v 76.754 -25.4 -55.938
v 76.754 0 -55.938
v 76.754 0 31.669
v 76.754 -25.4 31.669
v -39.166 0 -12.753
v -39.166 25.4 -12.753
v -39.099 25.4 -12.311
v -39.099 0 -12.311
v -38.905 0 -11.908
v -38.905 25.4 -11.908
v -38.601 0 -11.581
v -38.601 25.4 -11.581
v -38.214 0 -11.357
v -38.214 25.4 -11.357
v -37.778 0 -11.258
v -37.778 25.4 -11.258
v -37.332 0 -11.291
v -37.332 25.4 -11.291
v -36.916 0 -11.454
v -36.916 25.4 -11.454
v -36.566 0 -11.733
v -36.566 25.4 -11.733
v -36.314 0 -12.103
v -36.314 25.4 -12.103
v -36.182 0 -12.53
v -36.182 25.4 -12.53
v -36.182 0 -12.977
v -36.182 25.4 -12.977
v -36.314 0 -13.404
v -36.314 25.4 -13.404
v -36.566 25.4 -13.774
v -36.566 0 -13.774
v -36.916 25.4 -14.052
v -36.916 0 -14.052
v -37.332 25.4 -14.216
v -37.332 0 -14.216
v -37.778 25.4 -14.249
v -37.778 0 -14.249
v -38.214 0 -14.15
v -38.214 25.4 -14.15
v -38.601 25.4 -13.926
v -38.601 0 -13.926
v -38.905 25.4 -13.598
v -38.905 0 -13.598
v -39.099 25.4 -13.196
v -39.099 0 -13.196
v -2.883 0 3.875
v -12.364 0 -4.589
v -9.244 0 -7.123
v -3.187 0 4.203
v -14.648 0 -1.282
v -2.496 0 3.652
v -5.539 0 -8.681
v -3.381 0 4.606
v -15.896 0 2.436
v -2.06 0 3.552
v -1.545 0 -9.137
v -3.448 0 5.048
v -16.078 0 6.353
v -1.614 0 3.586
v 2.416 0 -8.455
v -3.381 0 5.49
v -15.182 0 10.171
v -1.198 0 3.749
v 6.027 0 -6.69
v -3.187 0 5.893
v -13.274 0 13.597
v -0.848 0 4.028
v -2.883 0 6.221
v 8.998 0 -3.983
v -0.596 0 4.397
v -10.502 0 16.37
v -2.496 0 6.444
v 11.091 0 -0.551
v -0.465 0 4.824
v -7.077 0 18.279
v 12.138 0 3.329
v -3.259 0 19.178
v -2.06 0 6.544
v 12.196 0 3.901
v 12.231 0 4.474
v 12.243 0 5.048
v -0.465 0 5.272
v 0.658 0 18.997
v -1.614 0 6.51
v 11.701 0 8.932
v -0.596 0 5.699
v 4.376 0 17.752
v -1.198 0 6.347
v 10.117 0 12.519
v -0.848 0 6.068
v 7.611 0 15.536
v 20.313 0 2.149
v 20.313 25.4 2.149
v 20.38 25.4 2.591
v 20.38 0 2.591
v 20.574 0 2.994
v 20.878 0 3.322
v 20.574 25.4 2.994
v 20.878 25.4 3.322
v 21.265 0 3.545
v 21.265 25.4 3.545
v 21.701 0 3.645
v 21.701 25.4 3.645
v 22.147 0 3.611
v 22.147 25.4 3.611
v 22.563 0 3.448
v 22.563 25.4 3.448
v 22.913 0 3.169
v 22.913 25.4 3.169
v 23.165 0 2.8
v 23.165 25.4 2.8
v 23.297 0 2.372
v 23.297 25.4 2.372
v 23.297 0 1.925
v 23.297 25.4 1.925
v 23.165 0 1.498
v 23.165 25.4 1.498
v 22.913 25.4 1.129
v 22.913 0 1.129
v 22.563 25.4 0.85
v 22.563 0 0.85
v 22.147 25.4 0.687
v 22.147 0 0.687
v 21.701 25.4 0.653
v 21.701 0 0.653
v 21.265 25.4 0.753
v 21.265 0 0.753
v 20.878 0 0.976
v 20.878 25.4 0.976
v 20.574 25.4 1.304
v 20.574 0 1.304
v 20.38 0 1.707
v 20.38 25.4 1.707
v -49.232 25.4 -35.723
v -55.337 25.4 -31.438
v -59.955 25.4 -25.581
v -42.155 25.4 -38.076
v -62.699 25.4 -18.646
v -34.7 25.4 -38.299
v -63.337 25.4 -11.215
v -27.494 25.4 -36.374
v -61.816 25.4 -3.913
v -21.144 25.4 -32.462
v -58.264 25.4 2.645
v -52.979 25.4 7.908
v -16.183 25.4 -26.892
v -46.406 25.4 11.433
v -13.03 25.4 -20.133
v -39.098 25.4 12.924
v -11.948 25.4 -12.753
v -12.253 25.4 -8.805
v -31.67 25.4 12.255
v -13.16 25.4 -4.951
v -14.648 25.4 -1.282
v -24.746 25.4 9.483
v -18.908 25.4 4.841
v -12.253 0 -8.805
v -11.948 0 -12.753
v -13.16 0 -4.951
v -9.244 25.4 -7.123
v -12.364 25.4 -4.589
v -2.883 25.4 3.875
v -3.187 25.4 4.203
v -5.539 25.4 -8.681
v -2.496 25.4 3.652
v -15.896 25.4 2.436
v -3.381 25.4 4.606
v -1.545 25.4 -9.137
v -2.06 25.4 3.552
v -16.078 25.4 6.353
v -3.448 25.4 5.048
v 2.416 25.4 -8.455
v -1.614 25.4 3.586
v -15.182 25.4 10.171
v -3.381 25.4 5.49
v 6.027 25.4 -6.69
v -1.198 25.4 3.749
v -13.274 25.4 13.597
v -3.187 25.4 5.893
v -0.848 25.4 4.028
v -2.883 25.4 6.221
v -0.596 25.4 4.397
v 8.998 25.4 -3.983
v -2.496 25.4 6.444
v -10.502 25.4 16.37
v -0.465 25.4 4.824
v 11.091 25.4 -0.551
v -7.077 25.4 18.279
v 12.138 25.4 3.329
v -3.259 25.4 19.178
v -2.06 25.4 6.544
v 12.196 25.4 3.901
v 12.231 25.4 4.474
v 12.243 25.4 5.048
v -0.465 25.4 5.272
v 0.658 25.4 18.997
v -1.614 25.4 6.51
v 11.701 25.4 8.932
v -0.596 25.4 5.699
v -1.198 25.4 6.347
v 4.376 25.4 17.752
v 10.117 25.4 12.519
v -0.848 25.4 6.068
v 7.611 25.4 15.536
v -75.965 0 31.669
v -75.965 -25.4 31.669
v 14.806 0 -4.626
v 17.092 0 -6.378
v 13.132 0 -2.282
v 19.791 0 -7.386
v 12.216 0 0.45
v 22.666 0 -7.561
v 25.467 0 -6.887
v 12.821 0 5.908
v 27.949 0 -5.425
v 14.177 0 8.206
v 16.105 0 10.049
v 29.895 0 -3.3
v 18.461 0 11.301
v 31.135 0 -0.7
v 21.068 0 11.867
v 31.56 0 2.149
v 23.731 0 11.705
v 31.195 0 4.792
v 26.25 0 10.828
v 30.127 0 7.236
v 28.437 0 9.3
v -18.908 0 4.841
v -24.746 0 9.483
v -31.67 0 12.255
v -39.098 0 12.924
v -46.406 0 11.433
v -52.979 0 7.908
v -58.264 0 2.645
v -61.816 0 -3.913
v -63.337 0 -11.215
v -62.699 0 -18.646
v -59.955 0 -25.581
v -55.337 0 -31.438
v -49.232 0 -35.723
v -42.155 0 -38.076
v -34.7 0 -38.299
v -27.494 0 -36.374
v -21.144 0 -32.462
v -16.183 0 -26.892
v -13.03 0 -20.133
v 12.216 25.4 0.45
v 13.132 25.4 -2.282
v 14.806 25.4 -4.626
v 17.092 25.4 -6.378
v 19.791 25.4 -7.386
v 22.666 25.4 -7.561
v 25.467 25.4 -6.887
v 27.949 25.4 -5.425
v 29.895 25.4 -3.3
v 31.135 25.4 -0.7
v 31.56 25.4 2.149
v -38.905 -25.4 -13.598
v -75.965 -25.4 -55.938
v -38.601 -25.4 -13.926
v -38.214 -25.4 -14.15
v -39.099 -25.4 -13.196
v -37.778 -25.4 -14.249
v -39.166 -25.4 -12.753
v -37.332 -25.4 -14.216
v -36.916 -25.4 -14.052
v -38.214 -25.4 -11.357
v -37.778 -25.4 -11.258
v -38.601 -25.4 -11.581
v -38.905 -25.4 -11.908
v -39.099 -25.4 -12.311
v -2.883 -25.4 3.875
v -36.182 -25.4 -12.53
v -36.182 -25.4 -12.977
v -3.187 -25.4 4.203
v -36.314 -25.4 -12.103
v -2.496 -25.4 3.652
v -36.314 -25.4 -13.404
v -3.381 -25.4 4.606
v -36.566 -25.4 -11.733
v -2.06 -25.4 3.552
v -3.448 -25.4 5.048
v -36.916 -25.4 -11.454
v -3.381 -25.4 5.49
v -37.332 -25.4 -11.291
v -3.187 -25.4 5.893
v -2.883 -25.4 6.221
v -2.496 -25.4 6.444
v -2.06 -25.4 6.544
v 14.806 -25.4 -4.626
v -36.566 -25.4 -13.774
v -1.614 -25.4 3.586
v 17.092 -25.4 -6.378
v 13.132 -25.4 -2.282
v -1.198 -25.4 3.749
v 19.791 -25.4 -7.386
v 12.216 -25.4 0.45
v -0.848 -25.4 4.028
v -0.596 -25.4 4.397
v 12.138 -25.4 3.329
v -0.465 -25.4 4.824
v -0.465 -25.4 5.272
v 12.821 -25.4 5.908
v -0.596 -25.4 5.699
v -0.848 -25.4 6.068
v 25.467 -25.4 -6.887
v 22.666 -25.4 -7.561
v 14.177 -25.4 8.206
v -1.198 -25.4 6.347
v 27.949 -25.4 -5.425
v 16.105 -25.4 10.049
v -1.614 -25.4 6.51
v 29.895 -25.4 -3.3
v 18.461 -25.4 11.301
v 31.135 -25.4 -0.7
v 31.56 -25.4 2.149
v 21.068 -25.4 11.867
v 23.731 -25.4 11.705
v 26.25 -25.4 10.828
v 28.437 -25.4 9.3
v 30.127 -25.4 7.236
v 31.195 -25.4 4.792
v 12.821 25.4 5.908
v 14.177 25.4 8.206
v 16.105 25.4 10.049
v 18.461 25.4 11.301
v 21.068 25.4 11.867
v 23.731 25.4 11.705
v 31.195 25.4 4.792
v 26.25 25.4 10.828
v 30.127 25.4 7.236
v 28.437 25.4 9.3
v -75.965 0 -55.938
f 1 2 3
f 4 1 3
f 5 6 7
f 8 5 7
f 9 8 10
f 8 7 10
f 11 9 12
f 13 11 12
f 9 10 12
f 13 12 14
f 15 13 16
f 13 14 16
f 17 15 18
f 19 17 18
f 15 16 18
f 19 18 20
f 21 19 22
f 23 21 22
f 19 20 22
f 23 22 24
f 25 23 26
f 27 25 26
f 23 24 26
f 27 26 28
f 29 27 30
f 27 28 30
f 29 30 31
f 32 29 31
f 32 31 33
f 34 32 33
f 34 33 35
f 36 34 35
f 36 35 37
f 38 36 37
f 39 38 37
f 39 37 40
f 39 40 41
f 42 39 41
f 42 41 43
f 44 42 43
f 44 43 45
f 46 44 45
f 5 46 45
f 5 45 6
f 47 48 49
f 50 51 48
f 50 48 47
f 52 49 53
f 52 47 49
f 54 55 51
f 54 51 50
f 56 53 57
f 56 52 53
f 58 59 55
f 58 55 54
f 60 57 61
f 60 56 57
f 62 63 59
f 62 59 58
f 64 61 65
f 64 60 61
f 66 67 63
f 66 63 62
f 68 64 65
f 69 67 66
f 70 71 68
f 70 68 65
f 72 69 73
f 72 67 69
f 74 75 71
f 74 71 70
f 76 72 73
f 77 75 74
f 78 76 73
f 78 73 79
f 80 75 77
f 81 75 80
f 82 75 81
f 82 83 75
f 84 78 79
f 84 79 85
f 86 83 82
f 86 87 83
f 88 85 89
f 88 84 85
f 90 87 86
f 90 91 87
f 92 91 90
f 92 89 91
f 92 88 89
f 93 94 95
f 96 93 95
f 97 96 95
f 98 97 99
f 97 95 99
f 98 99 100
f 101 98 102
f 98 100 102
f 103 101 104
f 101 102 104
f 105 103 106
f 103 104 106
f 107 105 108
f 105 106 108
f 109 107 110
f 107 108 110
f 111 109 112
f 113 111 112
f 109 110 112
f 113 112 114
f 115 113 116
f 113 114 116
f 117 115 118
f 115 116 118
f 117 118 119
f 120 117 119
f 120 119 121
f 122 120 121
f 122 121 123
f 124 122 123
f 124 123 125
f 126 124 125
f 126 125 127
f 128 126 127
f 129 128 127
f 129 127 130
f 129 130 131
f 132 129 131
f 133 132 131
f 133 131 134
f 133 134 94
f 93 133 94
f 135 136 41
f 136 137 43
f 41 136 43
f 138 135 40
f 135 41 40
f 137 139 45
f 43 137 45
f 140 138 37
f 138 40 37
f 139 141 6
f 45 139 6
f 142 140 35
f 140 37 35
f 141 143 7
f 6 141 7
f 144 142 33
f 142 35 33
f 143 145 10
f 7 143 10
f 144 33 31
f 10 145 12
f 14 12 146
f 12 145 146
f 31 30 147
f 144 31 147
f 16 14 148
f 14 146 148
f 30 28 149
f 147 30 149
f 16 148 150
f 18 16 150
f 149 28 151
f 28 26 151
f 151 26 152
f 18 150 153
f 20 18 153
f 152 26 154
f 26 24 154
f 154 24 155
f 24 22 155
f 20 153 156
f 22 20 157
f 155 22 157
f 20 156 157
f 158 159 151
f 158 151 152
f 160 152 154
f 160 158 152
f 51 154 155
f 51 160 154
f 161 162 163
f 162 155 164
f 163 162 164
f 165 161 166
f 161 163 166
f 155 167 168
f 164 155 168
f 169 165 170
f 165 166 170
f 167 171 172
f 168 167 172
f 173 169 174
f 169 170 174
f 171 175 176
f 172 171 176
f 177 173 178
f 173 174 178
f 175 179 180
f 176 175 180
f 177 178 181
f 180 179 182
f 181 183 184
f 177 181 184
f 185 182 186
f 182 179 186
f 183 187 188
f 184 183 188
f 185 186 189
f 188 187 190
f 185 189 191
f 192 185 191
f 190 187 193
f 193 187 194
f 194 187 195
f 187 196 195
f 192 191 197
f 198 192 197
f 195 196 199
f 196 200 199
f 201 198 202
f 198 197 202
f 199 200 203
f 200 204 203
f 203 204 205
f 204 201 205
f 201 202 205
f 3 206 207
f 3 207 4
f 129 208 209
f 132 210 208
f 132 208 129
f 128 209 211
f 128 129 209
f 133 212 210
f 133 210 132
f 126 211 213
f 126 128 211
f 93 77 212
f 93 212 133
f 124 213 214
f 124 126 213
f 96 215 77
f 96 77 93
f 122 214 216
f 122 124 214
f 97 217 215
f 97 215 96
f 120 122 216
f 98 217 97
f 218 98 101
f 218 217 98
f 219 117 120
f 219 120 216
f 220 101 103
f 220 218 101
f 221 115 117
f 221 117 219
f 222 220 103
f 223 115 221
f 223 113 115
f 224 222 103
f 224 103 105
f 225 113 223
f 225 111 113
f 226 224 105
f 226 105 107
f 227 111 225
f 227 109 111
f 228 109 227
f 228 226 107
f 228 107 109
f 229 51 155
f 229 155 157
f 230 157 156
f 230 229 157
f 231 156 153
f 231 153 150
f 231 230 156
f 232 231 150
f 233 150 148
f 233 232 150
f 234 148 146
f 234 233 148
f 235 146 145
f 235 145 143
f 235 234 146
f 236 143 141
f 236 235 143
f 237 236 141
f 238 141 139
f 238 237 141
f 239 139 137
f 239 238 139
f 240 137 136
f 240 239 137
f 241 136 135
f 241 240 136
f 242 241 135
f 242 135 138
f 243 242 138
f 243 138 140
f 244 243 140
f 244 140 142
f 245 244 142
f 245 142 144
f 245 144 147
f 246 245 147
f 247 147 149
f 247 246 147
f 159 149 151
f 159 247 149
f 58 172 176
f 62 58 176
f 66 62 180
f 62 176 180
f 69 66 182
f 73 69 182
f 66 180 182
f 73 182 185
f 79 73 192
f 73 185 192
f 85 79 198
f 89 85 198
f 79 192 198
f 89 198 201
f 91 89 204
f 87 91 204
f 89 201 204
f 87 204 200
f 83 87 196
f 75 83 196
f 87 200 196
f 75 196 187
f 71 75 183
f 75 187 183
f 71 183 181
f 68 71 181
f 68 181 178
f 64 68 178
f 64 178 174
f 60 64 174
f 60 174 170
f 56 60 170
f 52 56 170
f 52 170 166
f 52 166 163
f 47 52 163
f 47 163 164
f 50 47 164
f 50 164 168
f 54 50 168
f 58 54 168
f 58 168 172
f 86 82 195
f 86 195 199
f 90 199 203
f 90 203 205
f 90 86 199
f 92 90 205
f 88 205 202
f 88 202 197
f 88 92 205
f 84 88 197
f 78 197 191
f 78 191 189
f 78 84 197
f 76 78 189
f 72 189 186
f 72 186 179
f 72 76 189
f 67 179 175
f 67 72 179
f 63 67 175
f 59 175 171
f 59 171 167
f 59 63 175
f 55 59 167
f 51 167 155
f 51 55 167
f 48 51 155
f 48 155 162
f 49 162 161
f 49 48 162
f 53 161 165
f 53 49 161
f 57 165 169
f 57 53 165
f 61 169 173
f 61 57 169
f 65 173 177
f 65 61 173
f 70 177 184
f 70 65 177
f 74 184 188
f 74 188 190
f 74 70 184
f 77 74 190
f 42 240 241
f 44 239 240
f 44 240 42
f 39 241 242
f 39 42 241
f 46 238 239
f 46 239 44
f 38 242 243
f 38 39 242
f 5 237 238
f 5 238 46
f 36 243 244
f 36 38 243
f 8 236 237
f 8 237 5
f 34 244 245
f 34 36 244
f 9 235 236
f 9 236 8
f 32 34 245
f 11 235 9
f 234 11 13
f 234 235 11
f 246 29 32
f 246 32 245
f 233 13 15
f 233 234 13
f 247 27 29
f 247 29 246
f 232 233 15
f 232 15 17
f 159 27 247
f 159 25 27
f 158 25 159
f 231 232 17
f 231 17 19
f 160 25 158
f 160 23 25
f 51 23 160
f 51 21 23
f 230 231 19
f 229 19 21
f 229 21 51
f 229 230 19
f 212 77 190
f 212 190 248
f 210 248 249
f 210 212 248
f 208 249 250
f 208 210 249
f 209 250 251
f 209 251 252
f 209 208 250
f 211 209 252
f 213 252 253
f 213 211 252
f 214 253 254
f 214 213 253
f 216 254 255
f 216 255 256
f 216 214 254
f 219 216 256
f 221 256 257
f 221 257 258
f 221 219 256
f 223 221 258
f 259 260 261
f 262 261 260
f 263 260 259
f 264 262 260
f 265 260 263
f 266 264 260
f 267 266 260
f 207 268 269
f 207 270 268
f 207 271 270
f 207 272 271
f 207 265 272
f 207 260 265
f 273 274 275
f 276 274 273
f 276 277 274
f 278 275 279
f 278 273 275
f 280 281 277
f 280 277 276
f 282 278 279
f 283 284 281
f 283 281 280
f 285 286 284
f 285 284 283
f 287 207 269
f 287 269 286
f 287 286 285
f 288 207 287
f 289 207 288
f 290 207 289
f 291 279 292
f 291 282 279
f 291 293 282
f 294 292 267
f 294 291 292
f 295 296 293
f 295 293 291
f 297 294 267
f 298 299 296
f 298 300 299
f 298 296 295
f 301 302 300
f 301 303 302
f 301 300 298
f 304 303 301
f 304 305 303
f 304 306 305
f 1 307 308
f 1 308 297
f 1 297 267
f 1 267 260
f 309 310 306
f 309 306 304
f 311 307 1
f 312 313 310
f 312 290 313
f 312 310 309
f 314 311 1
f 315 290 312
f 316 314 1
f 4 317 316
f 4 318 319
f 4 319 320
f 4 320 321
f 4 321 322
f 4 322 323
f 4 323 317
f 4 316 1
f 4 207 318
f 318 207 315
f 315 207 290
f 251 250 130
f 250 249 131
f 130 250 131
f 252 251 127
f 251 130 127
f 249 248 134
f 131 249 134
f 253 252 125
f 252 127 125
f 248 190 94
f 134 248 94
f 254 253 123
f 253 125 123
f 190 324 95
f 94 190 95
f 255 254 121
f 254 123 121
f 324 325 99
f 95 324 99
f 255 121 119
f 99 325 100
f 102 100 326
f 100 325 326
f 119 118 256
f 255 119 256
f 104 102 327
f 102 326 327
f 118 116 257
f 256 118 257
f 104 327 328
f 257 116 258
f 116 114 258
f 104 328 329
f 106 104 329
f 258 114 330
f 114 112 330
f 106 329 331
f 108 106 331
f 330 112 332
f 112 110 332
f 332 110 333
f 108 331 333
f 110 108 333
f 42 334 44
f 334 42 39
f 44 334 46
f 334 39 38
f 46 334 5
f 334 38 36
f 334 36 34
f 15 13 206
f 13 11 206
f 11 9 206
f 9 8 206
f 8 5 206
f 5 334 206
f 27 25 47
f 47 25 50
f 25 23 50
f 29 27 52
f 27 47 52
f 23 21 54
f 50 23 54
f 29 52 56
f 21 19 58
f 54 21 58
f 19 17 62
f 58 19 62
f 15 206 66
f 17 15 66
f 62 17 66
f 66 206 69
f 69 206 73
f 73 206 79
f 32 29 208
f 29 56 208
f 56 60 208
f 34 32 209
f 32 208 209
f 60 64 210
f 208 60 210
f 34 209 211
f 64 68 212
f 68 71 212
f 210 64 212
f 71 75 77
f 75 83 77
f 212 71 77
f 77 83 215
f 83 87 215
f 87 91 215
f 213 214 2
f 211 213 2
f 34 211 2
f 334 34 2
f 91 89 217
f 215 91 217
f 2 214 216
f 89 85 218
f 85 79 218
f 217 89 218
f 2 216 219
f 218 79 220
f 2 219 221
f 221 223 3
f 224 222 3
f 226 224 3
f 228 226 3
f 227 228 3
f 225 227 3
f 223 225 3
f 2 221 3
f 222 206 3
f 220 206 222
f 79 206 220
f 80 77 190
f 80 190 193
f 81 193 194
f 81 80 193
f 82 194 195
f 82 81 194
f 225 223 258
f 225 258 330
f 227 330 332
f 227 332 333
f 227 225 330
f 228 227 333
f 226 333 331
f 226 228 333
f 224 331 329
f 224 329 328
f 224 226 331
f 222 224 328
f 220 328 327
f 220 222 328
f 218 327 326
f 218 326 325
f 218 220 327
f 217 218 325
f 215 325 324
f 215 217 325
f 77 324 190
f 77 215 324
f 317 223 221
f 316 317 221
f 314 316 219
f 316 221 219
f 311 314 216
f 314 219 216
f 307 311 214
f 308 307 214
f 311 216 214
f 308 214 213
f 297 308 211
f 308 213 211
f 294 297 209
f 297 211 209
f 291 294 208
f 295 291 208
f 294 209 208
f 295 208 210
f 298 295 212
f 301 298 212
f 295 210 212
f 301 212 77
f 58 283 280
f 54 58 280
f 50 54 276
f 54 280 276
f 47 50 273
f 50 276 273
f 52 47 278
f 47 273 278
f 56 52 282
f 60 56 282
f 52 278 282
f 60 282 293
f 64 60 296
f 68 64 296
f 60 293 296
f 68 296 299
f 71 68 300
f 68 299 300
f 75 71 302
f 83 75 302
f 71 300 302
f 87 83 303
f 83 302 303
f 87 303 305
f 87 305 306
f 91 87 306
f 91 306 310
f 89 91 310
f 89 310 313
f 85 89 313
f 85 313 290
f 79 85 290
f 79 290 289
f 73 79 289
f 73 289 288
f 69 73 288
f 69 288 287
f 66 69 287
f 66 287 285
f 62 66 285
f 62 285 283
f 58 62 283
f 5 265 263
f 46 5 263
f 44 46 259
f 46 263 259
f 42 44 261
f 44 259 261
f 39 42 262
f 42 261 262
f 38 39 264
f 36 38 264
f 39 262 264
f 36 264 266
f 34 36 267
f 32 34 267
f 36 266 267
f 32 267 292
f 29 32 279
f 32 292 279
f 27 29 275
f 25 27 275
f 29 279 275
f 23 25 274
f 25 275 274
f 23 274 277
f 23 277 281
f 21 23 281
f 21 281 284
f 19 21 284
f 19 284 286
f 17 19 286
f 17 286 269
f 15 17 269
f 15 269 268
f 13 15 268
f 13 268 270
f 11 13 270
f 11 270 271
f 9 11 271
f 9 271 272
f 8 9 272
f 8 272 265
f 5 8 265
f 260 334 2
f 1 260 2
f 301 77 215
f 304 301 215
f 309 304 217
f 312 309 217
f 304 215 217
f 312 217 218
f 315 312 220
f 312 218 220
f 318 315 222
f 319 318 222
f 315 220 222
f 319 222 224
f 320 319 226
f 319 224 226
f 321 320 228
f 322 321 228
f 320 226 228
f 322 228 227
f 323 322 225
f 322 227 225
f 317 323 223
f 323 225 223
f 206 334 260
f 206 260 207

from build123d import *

# Parameters (mm, degrees)
F0_W     = 152.7194529772
F0_H     = 87.6065120101
F1_DEPTH = 25.4
F2_DEPTH = 25.4
F4_DEPTH = 25.4
F5_DEPTH = 25.4
F8_D     = 3
F9_D     = 3
F10_D    = 3
F11_D    = 3
F12_D    = 3


# Not quite as in the source:
# - a feature of the source that left no trace in its solid (it failed there, or was rolled back) is left out


with BuildPart() as f1:
    # F0 (on Front) → F1 (new body)
    with BuildSketch(Plane.XZ):
        with Locations((0.3946200013, -12.1346861124)):
            Rectangle(F0_W, F0_H)
        with BuildLine():
            ThreePointArc((-14.6484100073, -1.2818487871), (-12.6323252843, -6.8608521587), (-11.9481632112, -12.7533727135))
            ThreePointArc((-11.9481632112, -12.7533727135), (-62.6990011381, -18.6458932683), (-14.6484100073, -1.2818487871))
        make_face(mode=Mode.SUBTRACT)
        with BuildLine():
            ThreePointArc((12.1383150794, 3.3293733395), (0.4596359109, -8.9368839284), (-14.6484100073, -1.2818487871))
            ThreePointArc((-14.6484100073, -1.2818487871), (-5.1992136459, 18.8610416578), (12.2427693617, 5.0479834842))
            ThreePointArc((12.2427693617, 5.0479834842), (12.2166317196, 4.1870927352), (12.1383150794, 3.3293733395))
        make_face(mode=Mode.SUBTRACT)
        with BuildLine():
            ThreePointArc((31.5604166727, 2.1489301), (21.2221824249, -7.5800405103), (12.1383150794, 3.3293733395))
            ThreePointArc((12.1383150794, 3.3293733395), (22.4048039377, 11.8779007103), (31.5604166727, 2.1489301))
        make_face(mode=Mode.SUBTRACT)
        with BuildLine():
            ThreePointArc((-14.6484100073, -1.2818487871), (-62.6990011381, -18.6458932683), (-11.9481632112, -12.7533727135))
            ThreePointArc((-11.9481632112, -12.7533727135), (-12.6323252843, -6.8608521587), (-14.6484100073, -1.2818487871))
        make_face()
        with BuildLine():
            ThreePointArc((12.2427693617, 5.0479834842), (-5.1992136459, 18.8610416578), (-14.6484100073, -1.2818487871))
            ThreePointArc((-14.6484100073, -1.2818487871), (0.4596359109, -8.9368839284), (12.1383150794, 3.3293733395))
            ThreePointArc((12.1383150794, 3.3293733395), (12.2166317196, 4.1870927352), (12.2427693617, 5.0479834842))
        make_face()
    extrude(amount=F1_DEPTH)

    # F11 (through all)
    with Locations(Plane(origin=(0, 0, 0), x_dir=(1, 0, 0), z_dir=(0, 1, 0))):
        with Locations((-1.9478002292, -5.0479834842)):
            Hole(F11_D / 2)

    # F12 (through all)
    with Locations(Plane(origin=(0, 0, 0), x_dir=(1, 0, 0), z_dir=(0, 1, 0))):
        with Locations((-37.6656632112, 12.7533727135)):
            Hole(F12_D / 2)


with BuildPart() as f2:
    # F0 (on Front) → F2 (new body)
    with BuildSketch(Plane.XZ):
        with BuildLine():
            ThreePointArc((-14.6484100073, -1.2818487871), (-62.6990011381, -18.6458932683), (-11.9481632112, -12.7533727135))
            ThreePointArc((-11.9481632112, -12.7533727135), (-12.6323252843, -6.8608521587), (-14.6484100073, -1.2818487871))
        make_face()
    extrude(amount=-F2_DEPTH)

    # F10 (through all)
    with Locations(Plane.XZ):
        with Locations((-37.6656632112, -12.7533727135)):
            Hole(F10_D / 2)


with BuildPart() as f2b:
    # F0 (on Front) → F2, piece 2 (new body)
    with BuildSketch(Plane.XZ):
        with BuildLine():
            ThreePointArc((31.5604166727, 2.1489301), (22.4048039377, 11.8779007103), (12.1383150794, 3.3293733395))
            ThreePointArc((12.1383150794, 3.3293733395), (21.2221824249, -7.5800405103), (31.5604166727, 2.1489301))
        make_face()
    extrude(amount=-F2_DEPTH)

    # F8 (through all)
    with Locations(Plane.XZ):
        with Locations((21.8134931813, 2.1489301)):
            Hole(F8_D / 2)


with BuildPart() as f4:
    # F0 (on Front) → F4 (new body)
    with BuildSketch(Plane.XZ):
        with BuildLine():
            ThreePointArc((31.5604166727, 2.1489301), (22.4048039377, 11.8779007103), (12.1383150794, 3.3293733395))
            ThreePointArc((12.1383150794, 3.3293733395), (21.2221824249, -7.5800405103), (31.5604166727, 2.1489301))
        make_face()
    extrude(amount=F4_DEPTH)


with BuildPart() as f5:
    # F0 (on Front) → F5 (new body)
    with BuildSketch(Plane.XZ):
        with BuildLine():
            ThreePointArc((12.2427693617, 5.0479834842), (-5.1992136459, 18.8610416578), (-14.6484100073, -1.2818487871))
            ThreePointArc((-14.6484100073, -1.2818487871), (0.4596359109, -8.9368839284), (12.1383150794, 3.3293733395))
            ThreePointArc((12.1383150794, 3.3293733395), (12.2166317196, 4.1870927352), (12.2427693617, 5.0479834842))
        make_face()
    extrude(amount=-F5_DEPTH)

    # F9 (through all)
    with Locations(Plane.XZ):
        with Locations((-1.9478002292, 5.0479834842)):
            Hole(F9_D / 2)


solid = Compound([f1.part, f2.part, f2b.part, f5.part])
